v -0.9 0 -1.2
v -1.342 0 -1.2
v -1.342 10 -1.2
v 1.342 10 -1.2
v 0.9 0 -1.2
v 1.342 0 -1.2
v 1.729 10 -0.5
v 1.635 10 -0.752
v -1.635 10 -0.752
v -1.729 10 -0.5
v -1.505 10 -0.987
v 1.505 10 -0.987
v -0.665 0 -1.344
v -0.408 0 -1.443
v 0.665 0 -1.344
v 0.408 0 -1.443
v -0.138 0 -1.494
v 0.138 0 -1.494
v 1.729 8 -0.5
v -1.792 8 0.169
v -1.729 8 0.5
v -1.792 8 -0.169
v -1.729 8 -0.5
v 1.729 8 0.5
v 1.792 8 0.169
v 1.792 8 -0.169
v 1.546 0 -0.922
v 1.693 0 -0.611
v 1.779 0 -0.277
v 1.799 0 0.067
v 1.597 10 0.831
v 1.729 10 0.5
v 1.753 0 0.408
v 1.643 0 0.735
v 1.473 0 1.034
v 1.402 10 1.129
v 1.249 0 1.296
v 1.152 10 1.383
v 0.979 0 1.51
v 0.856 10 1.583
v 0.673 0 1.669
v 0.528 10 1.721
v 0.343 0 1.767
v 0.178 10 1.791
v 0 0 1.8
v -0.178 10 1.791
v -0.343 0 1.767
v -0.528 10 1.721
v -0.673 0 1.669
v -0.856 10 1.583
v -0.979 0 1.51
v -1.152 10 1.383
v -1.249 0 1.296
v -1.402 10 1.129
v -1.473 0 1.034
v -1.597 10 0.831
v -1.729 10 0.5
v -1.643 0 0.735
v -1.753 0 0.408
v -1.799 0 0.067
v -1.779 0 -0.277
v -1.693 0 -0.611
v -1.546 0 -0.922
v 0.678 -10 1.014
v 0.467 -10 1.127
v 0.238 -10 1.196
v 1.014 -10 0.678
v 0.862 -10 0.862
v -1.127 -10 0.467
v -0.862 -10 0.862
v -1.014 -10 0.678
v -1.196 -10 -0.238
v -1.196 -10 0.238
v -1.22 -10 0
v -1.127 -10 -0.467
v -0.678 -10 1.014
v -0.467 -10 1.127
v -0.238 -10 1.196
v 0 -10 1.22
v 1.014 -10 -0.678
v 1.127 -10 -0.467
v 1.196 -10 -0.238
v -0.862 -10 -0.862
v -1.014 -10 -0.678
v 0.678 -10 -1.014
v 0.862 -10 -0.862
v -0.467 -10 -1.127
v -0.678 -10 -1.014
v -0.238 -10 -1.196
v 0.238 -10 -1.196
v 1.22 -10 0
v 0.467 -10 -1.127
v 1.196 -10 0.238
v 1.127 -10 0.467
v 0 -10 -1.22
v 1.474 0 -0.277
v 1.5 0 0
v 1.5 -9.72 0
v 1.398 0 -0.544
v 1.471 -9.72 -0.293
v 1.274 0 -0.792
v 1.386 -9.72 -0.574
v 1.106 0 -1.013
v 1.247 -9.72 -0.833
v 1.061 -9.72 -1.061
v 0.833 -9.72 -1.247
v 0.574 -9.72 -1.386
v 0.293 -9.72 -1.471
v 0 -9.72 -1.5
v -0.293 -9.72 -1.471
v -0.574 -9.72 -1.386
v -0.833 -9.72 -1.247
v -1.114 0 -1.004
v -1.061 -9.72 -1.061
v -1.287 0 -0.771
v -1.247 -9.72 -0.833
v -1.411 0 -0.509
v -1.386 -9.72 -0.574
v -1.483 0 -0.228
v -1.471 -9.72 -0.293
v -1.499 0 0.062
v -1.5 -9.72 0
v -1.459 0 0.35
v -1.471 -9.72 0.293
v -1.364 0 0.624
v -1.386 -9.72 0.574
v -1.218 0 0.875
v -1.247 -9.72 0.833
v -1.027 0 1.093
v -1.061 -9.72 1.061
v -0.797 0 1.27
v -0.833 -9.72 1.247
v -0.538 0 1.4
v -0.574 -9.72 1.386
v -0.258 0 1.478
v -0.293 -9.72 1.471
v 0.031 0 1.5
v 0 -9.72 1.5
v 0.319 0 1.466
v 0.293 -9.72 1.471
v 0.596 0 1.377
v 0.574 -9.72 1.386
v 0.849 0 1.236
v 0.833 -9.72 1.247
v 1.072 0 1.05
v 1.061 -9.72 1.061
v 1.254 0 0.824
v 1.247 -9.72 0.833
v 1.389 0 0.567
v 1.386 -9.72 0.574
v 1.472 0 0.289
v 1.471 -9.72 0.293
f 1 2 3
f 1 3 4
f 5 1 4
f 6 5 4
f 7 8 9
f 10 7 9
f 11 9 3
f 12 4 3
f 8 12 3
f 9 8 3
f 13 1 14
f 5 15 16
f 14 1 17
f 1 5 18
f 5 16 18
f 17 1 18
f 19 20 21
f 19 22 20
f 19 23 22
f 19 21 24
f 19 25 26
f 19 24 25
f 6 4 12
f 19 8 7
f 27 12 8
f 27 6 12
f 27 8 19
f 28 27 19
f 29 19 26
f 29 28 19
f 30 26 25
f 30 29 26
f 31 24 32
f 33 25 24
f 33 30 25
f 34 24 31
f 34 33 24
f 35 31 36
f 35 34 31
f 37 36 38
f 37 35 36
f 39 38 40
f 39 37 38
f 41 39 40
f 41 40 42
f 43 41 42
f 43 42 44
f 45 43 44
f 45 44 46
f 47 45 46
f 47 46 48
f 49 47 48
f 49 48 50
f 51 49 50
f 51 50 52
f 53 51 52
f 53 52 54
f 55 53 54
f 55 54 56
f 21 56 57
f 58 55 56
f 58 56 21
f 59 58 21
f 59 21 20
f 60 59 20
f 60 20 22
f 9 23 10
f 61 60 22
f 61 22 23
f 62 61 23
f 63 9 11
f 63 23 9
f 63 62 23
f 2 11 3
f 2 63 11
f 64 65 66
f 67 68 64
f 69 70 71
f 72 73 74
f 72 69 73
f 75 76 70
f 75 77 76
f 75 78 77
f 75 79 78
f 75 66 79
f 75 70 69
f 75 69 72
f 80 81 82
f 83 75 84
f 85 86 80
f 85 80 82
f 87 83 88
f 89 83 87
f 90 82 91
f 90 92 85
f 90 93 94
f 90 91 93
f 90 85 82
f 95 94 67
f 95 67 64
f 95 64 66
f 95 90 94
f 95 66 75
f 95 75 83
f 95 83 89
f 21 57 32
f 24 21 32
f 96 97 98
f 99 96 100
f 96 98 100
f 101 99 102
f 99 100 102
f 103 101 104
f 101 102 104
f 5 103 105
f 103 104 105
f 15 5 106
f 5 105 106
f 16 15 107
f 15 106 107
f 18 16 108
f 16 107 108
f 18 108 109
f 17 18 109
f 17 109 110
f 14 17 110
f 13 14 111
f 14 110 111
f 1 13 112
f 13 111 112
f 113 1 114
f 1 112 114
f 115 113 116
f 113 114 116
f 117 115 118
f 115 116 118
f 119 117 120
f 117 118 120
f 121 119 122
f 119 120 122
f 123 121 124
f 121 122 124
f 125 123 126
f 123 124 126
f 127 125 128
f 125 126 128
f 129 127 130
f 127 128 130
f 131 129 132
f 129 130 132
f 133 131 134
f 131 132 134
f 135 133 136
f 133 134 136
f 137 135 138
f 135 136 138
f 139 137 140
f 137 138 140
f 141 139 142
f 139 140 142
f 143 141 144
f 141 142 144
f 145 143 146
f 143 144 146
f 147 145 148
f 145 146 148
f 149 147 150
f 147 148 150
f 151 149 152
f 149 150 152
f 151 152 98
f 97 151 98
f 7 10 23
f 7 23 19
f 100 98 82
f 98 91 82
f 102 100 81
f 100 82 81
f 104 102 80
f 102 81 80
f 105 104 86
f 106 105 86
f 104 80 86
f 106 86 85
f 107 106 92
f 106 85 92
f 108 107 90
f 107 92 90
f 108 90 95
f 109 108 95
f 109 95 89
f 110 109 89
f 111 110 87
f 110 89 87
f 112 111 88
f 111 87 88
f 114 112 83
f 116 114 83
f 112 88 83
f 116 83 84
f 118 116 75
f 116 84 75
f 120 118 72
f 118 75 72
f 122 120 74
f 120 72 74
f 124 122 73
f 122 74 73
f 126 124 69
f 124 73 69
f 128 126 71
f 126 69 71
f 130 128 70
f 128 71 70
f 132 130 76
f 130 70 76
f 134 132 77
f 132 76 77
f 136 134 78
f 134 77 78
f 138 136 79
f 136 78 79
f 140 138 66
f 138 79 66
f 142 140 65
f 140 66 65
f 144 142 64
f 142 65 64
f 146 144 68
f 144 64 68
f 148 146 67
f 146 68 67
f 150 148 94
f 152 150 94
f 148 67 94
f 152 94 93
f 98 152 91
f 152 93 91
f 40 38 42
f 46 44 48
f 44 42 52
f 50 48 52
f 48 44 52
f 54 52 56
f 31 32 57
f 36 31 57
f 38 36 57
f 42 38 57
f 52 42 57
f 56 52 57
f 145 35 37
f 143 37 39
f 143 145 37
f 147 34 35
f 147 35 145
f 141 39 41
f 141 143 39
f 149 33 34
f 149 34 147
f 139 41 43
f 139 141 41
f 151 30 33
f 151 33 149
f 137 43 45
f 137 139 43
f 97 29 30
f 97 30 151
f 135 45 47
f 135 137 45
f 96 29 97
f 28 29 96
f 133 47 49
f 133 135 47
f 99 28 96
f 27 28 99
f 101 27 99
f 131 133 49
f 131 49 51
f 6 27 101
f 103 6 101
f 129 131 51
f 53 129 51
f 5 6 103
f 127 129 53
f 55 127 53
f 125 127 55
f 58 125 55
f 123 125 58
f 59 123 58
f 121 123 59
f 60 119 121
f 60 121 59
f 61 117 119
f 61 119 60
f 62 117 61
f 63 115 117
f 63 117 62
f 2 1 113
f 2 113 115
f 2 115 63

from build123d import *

# Parameters (mm, degrees)
BOSS_EXTRUDE1_DEPTH = 10
SKETCH2_W           = 5
SKETCH2_H           = 1
CUT_EXTRUDE1_DEPTH  = 2
SKETCH3_R           = 1.6
BOSS_EXTRUDE2_DEPTH = 10


# Read off the part's stored shape, not the designer's step: M3 Machine Threads Stud1
with BuildPart() as part:
    # Sketch1 → Boss-Extrude1 (new body)
    with BuildSketch(Plane(origin=(0, 0, 0), x_dir=(1, 0, 0), z_dir=(0, 1, 0))):
        with BuildLine():
            Line((-1.341640786, 1.2), (1.341640786, 1.2))
            ThreePointArc((1.341640786, 1.2), (0, -1.8), (-1.341640786, 1.2))
        make_face()
    extrude(amount=BOSS_EXTRUDE1_DEPTH)

    # Sketch2 → Cut-Extrude1 (cut)
    with BuildSketch(Plane(origin=(0, 10, 0), x_dir=(1, 0, 0), z_dir=(0, 1, 0))):
        Rectangle(SKETCH2_W, SKETCH2_H)
    extrude(amount=-CUT_EXTRUDE1_DEPTH, mode=Mode.SUBTRACT)

    # Sketch3 → Boss-Extrude2 (add)
    with BuildSketch(Plane.XZ):
        with Locations(Location((0, 0, 0), (0, 0, 228.590377891))):
            Circle(SKETCH3_R)
    extrude(amount=BOSS_EXTRUDE2_DEPTH)

    # M3 Machine Threads Stud1 outline → M3 Machine Threads Stud1 (revolve, cut)
    with BuildSketch(Plane.XY):
        Polygon((1.6, 0), (1.5, 0), (1.5, -9.7195), (1.2195, -10), (1.6, -10), align=None)
    revolve(axis=Axis((0, 0, 0), (0, 1, 0)), mode=Mode.SUBTRACT)


solid = part.part
